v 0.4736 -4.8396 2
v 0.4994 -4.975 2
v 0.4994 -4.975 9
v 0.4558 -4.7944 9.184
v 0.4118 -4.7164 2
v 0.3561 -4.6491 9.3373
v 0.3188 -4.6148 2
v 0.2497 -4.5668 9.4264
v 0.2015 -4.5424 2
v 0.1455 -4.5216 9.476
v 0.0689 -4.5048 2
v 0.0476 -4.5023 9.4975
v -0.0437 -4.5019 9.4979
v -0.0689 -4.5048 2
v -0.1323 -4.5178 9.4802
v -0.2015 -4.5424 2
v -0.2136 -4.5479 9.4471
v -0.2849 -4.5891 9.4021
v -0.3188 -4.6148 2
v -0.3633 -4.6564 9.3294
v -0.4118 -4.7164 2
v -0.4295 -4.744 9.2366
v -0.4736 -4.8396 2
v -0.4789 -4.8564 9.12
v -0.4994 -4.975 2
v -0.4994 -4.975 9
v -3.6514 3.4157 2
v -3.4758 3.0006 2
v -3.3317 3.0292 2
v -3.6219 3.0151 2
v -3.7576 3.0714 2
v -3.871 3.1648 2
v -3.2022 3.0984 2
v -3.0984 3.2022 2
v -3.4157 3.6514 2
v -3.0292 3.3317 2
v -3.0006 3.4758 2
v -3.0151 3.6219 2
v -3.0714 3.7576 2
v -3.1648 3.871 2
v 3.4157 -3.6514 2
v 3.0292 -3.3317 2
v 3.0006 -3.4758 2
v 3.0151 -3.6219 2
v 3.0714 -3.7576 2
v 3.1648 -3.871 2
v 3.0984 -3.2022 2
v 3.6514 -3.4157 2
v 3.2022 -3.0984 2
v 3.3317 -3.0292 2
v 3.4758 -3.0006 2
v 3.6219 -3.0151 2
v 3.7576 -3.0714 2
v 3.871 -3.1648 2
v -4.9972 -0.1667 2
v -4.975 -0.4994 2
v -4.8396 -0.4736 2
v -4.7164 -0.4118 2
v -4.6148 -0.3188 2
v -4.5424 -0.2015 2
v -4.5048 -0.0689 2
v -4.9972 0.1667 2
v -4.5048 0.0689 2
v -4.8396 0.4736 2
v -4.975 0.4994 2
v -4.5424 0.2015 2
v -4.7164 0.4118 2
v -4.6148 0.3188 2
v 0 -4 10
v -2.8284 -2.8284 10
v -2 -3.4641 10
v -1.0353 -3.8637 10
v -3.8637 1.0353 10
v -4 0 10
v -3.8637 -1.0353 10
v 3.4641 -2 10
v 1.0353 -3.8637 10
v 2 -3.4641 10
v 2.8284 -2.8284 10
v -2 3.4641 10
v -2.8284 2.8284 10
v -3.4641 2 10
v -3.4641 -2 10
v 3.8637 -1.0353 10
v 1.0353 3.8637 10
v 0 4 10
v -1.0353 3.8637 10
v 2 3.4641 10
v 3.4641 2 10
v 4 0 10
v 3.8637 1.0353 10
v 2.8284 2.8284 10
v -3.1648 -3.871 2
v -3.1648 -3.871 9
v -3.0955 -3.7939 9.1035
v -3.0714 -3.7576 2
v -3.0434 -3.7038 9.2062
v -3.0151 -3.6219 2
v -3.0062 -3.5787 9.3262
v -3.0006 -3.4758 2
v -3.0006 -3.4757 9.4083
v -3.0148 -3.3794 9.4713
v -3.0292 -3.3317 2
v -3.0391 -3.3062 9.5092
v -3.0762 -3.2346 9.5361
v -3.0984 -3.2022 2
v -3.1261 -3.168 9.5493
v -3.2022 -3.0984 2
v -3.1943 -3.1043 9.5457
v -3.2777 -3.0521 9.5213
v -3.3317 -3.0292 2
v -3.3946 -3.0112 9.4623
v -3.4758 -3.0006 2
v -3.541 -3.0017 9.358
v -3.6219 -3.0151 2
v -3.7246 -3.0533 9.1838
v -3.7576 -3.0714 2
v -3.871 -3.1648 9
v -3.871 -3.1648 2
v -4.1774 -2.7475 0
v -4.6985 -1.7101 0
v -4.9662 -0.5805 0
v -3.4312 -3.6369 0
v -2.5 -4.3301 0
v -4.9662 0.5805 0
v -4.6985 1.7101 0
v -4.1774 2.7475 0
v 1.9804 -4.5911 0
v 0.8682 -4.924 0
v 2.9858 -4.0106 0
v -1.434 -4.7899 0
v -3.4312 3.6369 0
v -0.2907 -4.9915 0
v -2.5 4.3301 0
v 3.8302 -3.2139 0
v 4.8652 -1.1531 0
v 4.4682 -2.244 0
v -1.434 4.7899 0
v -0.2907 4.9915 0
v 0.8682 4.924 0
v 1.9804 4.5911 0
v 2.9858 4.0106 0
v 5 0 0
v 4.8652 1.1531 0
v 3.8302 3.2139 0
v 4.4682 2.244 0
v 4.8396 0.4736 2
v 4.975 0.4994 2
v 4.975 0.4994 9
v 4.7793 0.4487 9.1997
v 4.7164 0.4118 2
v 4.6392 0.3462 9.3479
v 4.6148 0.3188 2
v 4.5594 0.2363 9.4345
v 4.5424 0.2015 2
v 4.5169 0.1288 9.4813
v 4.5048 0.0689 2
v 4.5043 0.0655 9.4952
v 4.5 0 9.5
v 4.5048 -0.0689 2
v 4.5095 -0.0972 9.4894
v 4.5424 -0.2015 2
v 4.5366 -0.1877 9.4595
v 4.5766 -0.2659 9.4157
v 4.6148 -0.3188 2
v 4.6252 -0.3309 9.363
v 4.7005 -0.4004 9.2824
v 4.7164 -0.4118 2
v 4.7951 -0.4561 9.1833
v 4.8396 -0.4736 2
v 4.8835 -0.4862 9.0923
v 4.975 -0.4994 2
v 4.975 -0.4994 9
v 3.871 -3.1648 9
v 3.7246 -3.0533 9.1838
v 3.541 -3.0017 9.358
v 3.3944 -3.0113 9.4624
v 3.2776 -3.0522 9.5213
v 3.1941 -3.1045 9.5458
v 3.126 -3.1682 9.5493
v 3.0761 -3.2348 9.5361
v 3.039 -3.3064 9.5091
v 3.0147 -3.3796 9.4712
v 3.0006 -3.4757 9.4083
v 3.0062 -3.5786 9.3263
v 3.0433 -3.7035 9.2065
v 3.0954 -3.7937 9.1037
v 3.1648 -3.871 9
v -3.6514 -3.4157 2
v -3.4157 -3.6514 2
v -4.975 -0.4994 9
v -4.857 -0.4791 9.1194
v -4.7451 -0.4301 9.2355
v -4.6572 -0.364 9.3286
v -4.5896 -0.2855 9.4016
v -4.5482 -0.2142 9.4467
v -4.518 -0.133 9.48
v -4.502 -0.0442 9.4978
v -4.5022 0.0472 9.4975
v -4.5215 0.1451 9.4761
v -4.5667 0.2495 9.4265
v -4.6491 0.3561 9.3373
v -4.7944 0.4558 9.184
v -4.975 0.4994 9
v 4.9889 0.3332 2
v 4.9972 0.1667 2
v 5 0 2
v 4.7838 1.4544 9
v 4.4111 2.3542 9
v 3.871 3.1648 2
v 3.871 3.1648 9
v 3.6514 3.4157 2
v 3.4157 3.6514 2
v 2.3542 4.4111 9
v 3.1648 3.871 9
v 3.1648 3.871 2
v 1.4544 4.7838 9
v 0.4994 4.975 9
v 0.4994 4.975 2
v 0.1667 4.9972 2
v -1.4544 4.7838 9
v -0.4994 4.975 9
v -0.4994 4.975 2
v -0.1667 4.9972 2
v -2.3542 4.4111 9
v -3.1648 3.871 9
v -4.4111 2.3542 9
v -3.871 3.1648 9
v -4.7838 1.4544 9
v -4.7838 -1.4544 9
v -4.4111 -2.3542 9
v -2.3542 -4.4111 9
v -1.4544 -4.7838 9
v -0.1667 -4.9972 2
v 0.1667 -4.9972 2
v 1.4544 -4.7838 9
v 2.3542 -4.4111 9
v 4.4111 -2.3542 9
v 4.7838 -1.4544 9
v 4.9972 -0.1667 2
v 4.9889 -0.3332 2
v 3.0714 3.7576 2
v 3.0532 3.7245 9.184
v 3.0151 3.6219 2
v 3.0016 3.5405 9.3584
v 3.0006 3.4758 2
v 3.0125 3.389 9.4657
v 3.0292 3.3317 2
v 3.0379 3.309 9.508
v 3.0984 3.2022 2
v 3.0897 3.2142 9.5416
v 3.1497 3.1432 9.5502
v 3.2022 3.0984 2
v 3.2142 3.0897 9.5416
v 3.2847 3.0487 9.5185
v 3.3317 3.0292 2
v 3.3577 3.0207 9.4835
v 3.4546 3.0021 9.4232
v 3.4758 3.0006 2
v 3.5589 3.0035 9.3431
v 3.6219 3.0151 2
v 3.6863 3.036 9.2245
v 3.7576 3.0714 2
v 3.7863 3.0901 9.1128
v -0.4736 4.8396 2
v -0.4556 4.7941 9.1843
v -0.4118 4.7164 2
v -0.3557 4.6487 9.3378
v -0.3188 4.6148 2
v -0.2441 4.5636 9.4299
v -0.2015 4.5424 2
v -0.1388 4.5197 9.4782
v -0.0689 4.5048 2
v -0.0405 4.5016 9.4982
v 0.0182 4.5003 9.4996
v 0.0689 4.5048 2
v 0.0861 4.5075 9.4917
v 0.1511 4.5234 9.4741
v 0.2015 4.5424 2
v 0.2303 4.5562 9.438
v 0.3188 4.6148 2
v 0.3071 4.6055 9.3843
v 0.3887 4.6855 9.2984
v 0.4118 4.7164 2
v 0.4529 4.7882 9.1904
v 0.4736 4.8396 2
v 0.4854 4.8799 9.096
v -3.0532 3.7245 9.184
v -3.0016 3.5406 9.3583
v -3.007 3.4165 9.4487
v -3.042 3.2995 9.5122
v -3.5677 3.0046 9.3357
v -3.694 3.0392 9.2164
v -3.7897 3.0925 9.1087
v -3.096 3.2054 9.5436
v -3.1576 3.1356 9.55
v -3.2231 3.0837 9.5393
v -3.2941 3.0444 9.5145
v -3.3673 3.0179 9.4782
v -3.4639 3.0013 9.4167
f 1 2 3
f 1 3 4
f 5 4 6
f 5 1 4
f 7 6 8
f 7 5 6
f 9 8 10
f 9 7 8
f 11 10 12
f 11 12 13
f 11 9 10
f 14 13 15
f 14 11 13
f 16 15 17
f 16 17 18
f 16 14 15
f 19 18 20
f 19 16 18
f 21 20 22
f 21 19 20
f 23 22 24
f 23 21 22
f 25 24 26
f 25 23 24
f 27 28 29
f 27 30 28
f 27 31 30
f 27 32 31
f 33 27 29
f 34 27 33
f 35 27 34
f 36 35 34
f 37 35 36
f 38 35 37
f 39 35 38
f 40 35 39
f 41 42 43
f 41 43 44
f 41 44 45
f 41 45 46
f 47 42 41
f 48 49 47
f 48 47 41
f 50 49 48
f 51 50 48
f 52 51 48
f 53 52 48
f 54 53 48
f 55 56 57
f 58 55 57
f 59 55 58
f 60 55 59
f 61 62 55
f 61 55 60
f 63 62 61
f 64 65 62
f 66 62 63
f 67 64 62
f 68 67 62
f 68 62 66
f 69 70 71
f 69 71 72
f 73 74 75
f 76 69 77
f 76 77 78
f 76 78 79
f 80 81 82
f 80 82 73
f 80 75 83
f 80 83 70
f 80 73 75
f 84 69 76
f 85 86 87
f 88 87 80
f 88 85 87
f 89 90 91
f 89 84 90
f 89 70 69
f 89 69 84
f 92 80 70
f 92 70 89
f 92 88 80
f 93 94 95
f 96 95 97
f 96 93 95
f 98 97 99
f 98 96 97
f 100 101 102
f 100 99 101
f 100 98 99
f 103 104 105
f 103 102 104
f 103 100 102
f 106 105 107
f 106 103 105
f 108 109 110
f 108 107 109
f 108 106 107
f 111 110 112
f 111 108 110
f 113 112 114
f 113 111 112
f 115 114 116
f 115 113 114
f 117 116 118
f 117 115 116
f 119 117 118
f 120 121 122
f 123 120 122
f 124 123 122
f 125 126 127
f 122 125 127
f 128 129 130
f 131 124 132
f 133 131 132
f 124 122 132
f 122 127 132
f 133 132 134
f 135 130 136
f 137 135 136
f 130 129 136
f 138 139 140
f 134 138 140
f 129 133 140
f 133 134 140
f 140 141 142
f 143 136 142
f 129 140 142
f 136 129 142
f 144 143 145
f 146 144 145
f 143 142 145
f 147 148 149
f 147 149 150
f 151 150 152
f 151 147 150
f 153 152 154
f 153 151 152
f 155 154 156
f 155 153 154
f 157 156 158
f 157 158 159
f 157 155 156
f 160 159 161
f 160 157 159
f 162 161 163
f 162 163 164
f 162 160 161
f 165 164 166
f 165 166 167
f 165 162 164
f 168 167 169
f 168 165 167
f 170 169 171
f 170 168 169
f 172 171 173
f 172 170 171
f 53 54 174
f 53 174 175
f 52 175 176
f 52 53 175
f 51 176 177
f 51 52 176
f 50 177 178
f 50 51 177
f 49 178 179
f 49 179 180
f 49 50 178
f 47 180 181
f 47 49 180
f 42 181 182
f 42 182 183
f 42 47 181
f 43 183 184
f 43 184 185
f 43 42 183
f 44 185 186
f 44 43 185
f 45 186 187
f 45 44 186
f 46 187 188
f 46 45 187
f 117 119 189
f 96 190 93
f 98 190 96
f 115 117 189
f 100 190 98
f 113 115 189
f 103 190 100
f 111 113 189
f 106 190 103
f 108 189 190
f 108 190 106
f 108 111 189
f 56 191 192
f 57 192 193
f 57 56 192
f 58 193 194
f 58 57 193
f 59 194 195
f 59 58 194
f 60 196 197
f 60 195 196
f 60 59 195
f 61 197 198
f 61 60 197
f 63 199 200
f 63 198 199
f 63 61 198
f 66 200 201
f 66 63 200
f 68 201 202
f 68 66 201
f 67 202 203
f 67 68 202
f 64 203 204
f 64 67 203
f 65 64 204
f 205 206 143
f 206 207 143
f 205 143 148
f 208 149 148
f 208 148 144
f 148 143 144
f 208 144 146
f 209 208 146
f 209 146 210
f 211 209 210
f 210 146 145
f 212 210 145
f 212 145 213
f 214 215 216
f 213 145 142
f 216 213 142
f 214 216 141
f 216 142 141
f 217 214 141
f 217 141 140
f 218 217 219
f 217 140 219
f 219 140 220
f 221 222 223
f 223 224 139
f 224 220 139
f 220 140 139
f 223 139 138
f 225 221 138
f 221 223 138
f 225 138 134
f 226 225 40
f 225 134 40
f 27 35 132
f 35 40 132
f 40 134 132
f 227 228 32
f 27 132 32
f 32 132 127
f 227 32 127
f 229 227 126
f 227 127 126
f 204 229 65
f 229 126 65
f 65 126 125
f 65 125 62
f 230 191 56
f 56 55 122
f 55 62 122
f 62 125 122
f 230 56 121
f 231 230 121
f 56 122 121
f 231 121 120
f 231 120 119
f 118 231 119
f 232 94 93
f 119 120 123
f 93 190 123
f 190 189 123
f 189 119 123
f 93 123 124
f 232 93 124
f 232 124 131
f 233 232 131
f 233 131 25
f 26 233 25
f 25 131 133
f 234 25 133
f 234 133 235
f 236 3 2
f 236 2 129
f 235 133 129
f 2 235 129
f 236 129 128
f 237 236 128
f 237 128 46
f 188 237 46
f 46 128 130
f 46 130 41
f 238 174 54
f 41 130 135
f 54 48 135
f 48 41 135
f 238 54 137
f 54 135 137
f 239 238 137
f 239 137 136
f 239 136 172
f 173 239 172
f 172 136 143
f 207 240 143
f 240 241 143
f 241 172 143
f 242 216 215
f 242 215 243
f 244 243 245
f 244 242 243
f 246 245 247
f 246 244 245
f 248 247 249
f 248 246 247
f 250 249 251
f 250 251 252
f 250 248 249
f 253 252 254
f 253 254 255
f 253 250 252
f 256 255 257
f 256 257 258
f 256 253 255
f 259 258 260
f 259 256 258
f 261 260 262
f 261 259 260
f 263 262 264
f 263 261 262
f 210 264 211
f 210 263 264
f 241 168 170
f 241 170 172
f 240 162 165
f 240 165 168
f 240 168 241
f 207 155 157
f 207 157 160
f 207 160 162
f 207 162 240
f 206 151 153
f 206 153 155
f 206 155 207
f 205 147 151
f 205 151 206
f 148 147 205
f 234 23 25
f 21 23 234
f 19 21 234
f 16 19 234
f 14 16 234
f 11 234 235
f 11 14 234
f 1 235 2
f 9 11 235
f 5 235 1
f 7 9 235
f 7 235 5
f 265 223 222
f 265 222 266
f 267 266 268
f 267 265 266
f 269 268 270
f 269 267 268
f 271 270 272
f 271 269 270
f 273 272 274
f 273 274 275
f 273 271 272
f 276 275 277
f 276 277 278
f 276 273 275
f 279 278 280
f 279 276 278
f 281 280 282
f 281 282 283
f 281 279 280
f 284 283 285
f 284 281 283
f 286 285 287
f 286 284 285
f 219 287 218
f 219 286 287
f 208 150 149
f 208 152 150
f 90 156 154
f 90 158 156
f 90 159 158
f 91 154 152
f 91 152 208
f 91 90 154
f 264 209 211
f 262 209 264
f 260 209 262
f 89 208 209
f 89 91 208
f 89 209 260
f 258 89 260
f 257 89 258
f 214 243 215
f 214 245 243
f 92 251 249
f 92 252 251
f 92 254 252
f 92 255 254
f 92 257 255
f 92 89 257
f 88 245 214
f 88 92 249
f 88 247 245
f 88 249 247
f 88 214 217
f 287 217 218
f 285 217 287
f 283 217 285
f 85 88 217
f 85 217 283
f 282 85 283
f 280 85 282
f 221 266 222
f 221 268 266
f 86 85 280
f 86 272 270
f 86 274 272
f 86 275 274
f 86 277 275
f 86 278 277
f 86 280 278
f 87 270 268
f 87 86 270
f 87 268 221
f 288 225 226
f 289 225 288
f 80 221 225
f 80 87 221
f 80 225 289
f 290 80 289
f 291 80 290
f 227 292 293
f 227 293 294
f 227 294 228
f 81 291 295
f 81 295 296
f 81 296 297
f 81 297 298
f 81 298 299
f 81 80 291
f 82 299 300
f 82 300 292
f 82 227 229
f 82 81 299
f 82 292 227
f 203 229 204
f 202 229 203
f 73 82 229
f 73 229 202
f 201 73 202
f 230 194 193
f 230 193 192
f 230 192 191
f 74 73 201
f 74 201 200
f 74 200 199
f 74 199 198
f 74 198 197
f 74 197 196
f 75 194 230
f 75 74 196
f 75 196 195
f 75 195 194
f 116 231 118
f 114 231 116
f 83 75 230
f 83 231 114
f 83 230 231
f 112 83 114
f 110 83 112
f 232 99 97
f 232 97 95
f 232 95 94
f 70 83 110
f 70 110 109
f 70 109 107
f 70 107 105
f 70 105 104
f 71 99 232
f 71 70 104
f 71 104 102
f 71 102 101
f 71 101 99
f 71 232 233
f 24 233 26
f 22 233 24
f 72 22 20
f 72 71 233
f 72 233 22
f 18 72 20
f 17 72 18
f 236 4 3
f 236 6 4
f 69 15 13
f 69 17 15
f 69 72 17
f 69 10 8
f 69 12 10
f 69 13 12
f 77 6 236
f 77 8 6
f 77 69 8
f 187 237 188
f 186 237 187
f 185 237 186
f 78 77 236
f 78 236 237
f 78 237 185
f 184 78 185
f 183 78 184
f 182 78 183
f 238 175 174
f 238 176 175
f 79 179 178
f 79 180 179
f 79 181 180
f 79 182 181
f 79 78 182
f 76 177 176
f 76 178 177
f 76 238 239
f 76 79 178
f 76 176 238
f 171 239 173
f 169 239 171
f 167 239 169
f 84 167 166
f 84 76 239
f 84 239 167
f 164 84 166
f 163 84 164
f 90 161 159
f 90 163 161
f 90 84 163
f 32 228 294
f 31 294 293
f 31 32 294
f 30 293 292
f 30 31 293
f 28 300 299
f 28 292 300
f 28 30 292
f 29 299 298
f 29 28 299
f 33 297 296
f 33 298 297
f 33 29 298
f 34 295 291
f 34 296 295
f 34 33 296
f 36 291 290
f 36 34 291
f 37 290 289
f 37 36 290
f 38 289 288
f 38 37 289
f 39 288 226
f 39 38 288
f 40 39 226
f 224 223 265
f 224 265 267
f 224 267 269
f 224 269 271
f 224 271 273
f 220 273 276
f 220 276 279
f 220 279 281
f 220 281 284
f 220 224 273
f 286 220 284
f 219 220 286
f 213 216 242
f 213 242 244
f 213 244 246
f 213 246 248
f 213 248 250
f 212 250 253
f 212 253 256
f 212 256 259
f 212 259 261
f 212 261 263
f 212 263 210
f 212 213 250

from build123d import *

# Parameters (mm, degrees)
CYLINDER002_R     = 0.5
CYLINDER002_DEPTH = 10
CYLINDER003_R     = 0.5
CYLINDER003_DEPTH = 10
CYLINDER004_R     = 0.5
CYLINDER004_DEPTH = 10
CYLINDER005_R     = 0.5
CYLINDER005_DEPTH = 10
CYLINDER006_R     = 0.5
CYLINDER006_DEPTH = 10
CYLINDER007_R     = 0.5
CYLINDER007_DEPTH = 10
CYLINDER008_R     = 0.5
CYLINDER008_DEPTH = 10
CYLINDER001_R     = 0.5
CYLINDER001_DEPTH = 10
CYLINDER_R        = 5
CYLINDER_DEPTH    = 10
CHAMFER_SIZE      = 1


with BuildPart() as cylinder002:
    # Cylinder002 → Cylinder002 (new body)
    with BuildSketch(Plane(origin=(-5, 0, 2), x_dir=(1, 0, 0), z_dir=(0, 0, 1))):
        Circle(CYLINDER002_R)
    extrude(amount=CYLINDER002_DEPTH)


with BuildPart() as cylinder003:
    # Cylinder003 → Cylinder003 (new body)
    with BuildSketch(Plane(origin=(0, 5, 2), x_dir=(1, 0, 0), z_dir=(0, 0, 1))):
        Circle(CYLINDER003_R)
    extrude(amount=CYLINDER003_DEPTH)


with BuildPart() as cylinder004:
    # Cylinder004 → Cylinder004 (new body)
    with BuildSketch(Plane(origin=(0, -5, 2), x_dir=(1, 0, 0), z_dir=(0, 0, 1))):
        Circle(CYLINDER004_R)
    extrude(amount=CYLINDER004_DEPTH)


with BuildPart() as cylinder005:
    # Cylinder005 → Cylinder005 (new body)
    with BuildSketch(Plane(origin=(3.5, -3.5, 2), x_dir=(1, 0, 0), z_dir=(0, 0, 1))):
        Circle(CYLINDER005_R)
    extrude(amount=CYLINDER005_DEPTH)


with BuildPart() as cylinder006:
    # Cylinder006 → Cylinder006 (new body)
    with BuildSketch(Plane(origin=(-3.5, 3.5, 2), x_dir=(1, 0, 0), z_dir=(0, 0, 1))):
        Circle(CYLINDER006_R)
    extrude(amount=CYLINDER006_DEPTH)


with BuildPart() as cylinder007:
    # Cylinder007 → Cylinder007 (new body)
    with BuildSketch(Plane(origin=(3.5, 3.5, 2), x_dir=(1, 0, 0), z_dir=(0, 0, 1))):
        Circle(CYLINDER007_R)
    extrude(amount=CYLINDER007_DEPTH)


with BuildPart() as cylinder008:
    # Cylinder008 → Cylinder008 (new body)
    with BuildSketch(Plane(origin=(-3.5, -3.5, 2), x_dir=(1, 0, 0), z_dir=(0, 0, 1))):
        Circle(CYLINDER008_R)
    extrude(amount=CYLINDER008_DEPTH)


with BuildPart() as cylinder001:
    # Cylinder001 → Cylinder001 (new body)
    with BuildSketch(Plane(origin=(5, 0, 2), x_dir=(1, 0, 0), z_dir=(0, 0, 1))):
        Circle(CYLINDER001_R)
    extrude(amount=CYLINDER001_DEPTH)


with BuildPart() as cut007:
    # Cylinder → Cylinder (new body)
    with BuildSketch(Plane.XY):
        Circle(CYLINDER_R)
    extrude(amount=CYLINDER_DEPTH)

    # Chamfer
    chamfer_edges = [cut007.edges().sort_by_distance(p)[0] for p in [
        (-5, 0, 10),
    ]]
    chamfer(chamfer_edges, length=CHAMFER_SIZE)

    # Cut: cut Cylinder001
    add(cylinder001.part, mode=Mode.SUBTRACT)

    # Cut001: cut Cylinder008
    add(cylinder008.part, mode=Mode.SUBTRACT)

    # Cut002: cut Cylinder007
    add(cylinder007.part, mode=Mode.SUBTRACT)

    # Cut003: cut Cylinder006
    add(cylinder006.part, mode=Mode.SUBTRACT)

    # Cut004: cut Cylinder005
    add(cylinder005.part, mode=Mode.SUBTRACT)

    # Cut005: cut Cylinder004
    add(cylinder004.part, mode=Mode.SUBTRACT)

    # Cut006: cut Cylinder003
    add(cylinder003.part, mode=Mode.SUBTRACT)

    # Cut007: cut Cylinder002
    add(cylinder002.part, mode=Mode.SUBTRACT)


solid = cut007.part
